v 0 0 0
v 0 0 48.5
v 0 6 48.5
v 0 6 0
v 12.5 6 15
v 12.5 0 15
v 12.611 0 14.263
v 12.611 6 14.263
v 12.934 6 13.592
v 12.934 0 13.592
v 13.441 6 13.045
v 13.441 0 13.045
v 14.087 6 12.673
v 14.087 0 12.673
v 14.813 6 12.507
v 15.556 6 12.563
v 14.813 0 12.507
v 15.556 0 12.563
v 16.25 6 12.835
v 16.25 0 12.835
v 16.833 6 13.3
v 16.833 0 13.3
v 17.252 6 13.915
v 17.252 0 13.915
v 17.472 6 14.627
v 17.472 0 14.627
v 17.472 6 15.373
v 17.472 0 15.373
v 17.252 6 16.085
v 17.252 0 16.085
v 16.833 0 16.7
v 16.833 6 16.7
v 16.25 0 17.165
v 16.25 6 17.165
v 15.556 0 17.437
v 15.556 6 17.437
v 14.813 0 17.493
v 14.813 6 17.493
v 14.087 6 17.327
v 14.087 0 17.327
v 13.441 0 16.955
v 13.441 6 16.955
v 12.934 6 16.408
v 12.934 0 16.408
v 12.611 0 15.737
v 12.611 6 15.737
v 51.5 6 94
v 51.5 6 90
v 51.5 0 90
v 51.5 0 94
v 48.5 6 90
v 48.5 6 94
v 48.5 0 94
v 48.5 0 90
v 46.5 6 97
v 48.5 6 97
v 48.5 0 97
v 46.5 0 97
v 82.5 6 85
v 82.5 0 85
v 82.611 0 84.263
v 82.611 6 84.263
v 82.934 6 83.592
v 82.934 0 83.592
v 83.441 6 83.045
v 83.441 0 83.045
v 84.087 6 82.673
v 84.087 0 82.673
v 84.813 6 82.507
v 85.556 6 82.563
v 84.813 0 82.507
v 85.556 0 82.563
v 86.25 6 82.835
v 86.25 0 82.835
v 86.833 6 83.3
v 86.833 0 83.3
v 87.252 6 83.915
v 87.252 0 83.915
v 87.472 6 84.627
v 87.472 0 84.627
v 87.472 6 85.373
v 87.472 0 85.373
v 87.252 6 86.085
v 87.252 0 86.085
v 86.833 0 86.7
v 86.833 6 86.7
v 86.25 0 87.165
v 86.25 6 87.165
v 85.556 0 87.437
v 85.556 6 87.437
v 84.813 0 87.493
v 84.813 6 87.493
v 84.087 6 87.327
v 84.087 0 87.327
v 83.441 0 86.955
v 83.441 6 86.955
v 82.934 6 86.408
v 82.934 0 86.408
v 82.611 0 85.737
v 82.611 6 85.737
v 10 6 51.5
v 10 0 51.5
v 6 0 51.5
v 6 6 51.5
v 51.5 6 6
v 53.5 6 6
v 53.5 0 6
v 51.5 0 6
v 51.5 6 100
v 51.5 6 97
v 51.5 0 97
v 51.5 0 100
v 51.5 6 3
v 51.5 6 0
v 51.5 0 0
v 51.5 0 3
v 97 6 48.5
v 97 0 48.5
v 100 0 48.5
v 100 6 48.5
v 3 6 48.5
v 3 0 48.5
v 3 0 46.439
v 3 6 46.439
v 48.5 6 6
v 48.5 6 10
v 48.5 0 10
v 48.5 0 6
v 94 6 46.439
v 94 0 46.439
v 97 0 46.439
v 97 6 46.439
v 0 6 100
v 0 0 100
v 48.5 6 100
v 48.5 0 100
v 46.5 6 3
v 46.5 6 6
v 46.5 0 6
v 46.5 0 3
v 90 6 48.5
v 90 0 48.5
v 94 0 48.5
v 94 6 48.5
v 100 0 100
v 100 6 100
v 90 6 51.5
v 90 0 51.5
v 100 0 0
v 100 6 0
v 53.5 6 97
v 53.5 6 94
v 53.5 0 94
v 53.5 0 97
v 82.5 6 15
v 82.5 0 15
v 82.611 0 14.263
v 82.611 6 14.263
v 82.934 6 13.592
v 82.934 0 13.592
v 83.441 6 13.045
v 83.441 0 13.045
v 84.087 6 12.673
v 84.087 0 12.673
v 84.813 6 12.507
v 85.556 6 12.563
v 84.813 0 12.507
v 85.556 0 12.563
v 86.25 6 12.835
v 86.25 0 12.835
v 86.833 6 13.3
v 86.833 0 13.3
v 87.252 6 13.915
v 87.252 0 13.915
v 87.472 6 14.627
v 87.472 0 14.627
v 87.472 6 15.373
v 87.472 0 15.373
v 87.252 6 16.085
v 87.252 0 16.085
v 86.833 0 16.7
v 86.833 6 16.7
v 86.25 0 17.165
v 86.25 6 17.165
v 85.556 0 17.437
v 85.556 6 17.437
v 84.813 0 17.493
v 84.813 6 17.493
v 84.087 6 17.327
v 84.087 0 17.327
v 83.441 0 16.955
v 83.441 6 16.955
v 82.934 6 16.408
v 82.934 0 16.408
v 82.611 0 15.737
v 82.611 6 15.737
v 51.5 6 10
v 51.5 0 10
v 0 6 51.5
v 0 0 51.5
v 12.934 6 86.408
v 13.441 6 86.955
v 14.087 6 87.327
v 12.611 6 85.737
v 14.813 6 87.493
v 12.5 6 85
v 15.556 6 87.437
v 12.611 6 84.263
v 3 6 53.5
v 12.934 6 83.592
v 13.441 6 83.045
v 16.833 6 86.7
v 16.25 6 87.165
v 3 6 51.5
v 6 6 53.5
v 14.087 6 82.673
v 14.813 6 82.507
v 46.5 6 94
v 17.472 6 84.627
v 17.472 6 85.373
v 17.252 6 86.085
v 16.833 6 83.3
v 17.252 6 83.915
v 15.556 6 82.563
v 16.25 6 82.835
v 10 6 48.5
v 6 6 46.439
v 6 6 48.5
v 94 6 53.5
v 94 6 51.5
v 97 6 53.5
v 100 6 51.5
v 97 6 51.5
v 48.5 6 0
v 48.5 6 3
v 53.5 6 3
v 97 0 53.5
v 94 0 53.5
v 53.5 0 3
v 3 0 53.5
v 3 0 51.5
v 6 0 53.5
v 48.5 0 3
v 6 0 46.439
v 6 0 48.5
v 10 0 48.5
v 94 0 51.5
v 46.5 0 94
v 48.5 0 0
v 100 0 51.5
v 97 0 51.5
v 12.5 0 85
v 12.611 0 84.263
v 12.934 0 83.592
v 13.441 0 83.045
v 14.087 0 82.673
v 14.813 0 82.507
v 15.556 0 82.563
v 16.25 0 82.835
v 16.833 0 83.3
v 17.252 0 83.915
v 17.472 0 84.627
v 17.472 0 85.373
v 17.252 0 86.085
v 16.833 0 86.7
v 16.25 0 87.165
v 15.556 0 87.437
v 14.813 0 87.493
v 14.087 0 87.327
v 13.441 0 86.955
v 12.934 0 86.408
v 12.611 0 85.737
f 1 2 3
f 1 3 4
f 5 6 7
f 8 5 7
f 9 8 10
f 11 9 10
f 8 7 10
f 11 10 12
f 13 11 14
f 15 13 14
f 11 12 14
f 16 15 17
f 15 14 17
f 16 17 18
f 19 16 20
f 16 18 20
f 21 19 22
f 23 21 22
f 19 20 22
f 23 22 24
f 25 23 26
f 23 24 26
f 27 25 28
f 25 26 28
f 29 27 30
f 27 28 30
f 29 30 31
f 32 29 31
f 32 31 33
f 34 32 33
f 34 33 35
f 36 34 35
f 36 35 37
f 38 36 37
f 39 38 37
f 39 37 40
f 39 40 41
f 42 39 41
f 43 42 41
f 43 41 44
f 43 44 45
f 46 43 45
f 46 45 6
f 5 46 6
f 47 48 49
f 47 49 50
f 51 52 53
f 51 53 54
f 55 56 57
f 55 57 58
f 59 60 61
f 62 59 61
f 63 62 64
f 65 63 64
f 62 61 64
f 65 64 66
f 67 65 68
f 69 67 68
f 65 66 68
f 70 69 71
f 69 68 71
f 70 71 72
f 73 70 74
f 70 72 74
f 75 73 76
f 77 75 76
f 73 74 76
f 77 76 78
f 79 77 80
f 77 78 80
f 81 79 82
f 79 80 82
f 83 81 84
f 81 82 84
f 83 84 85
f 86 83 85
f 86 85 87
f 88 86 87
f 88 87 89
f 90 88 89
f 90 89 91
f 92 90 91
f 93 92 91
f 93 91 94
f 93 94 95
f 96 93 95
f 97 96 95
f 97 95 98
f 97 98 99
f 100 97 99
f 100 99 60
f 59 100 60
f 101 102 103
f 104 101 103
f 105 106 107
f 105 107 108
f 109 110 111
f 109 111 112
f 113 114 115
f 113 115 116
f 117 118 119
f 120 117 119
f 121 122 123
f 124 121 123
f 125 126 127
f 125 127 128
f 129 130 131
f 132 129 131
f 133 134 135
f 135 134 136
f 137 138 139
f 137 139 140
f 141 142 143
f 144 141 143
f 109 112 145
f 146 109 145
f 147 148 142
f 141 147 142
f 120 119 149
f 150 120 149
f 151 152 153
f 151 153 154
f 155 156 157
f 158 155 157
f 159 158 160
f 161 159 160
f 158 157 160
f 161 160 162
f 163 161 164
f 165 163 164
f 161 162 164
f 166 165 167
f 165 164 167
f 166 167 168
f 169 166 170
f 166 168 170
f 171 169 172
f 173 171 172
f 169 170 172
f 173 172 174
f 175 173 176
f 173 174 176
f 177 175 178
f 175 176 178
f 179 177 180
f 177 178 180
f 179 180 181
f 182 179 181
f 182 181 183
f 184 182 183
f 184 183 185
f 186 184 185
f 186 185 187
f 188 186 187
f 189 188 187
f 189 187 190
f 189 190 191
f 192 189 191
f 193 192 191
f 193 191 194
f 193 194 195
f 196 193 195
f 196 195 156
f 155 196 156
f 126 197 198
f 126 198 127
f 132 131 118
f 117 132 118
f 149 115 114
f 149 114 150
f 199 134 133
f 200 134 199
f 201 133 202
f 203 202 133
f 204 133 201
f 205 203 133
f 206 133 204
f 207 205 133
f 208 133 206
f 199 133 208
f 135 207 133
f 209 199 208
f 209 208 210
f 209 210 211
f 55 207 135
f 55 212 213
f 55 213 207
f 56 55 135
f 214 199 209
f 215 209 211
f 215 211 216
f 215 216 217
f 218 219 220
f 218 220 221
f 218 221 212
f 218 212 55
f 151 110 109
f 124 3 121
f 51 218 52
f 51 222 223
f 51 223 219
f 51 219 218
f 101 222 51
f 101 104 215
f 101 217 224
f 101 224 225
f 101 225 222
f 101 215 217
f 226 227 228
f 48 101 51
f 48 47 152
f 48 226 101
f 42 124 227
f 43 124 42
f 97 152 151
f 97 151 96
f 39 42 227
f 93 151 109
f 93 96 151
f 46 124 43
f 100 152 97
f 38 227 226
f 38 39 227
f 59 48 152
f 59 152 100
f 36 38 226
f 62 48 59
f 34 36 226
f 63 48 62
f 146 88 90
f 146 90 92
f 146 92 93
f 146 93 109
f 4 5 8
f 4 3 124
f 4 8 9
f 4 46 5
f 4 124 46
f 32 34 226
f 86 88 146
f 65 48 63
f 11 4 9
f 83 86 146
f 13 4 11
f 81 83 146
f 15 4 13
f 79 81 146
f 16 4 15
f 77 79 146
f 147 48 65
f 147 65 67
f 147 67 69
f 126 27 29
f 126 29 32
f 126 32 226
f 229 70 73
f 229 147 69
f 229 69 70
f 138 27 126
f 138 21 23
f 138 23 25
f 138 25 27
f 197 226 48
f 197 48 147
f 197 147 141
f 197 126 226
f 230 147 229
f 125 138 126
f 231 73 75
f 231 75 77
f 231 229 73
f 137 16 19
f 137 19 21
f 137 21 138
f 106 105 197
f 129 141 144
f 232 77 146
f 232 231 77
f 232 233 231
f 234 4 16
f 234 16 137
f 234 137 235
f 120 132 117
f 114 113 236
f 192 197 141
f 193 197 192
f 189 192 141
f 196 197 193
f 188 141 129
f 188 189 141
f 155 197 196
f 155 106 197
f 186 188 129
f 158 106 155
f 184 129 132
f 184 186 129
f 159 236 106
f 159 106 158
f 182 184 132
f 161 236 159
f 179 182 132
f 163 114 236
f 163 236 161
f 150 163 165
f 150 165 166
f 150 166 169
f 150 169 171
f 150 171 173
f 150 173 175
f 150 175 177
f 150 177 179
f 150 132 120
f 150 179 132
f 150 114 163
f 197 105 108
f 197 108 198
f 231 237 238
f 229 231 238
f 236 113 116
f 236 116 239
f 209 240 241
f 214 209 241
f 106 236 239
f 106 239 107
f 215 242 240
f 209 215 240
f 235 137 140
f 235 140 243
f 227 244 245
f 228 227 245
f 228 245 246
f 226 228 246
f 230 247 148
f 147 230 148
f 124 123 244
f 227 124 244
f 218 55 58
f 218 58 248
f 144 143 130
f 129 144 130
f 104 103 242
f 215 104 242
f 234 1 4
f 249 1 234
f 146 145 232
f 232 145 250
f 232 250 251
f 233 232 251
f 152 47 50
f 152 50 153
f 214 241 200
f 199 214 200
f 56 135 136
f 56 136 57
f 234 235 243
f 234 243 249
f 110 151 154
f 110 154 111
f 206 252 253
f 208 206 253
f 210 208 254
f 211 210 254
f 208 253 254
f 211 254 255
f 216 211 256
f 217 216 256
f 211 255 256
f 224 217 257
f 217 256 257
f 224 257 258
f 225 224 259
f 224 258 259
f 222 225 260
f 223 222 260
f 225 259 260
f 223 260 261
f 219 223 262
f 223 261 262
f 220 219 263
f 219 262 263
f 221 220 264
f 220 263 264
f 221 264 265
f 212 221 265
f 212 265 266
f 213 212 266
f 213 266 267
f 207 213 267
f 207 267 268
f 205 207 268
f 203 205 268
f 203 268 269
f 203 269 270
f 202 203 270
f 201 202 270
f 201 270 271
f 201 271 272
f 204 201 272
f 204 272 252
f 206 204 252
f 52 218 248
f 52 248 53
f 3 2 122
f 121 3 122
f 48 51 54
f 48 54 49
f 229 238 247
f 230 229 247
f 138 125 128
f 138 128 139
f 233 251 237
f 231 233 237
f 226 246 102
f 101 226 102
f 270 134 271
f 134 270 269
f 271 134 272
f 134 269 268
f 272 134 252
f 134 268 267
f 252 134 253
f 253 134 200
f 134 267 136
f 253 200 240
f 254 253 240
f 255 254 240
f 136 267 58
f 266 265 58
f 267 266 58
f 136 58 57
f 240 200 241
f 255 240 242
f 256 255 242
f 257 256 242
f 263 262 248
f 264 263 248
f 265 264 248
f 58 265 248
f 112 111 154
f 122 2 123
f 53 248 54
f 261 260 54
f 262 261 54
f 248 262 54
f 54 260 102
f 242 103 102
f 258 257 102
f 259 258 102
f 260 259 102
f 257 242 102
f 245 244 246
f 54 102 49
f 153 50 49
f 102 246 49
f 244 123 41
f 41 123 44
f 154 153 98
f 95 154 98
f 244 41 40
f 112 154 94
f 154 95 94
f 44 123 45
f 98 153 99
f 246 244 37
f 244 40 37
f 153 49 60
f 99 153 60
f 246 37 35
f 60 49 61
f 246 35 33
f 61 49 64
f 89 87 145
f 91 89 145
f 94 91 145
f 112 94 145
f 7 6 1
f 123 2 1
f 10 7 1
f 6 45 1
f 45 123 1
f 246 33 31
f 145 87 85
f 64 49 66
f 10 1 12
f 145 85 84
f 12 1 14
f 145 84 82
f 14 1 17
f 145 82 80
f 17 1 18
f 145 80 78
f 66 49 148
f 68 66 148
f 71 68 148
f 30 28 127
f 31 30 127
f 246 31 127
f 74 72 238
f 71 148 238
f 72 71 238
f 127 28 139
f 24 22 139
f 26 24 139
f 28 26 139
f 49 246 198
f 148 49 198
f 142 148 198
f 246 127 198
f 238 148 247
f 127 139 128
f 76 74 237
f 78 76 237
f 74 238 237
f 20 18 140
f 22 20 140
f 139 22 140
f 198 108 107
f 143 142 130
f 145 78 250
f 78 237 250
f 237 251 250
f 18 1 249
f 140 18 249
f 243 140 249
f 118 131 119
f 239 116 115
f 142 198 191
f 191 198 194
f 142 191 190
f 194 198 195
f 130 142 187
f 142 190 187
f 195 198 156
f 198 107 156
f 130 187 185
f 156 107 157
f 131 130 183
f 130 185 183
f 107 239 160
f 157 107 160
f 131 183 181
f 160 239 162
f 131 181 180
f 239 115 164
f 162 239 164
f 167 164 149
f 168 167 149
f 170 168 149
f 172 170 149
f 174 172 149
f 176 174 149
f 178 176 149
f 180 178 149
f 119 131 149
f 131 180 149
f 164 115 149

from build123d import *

# Parameters (mm, degrees)
SKETCH1_W           = 100
SKETCH1_H           = 100
BOSS_EXTRUDE1_DEPTH = 6
CUT_EXTRUDE1_DEPTH  = 7
SKETCH4_R           = 2.5
CUT_EXTRUDE3_DEPTH  = 7
CUT_EXTRUDE4_DEPTH  = 10


with BuildPart() as part:
    # Sketch1 → Boss-Extrude1 (new body)
    with BuildSketch(Plane(origin=(0, 0, 0), x_dir=(1, 0, 0), z_dir=(0, 1, 0))):
        with Locations((50, -50)):
            Rectangle(SKETCH1_W, SKETCH1_H)
    extrude(amount=BOSS_EXTRUDE1_DEPTH)

    # Sketch2 → Cut-Extrude1 (cut, through all)
    with BuildSketch(Plane(origin=(0, 6, 0), x_dir=(1, 0, 0), z_dir=(0, 1, 0))):
        Polygon((48.5, 0), (51.5, 0), (51.5, -3), (53.5, -3), (53.5, -6), (51.5, -6), (51.5, -10), (48.5, -10), (48.5, -6), (46.5, -6), (46.5, -3), (48.5, -3), align=None)
        Polygon((48.5, -100), (48.5, -97), (46.5, -97), (46.5, -94), (48.5, -94), (48.5, -90), (51.5, -90), (51.5, -94), (53.5, -94), (53.5, -97), (51.5, -97), (51.5, -100), align=None)
    extrude(amount=-CUT_EXTRUDE1_DEPTH, mode=Mode.SUBTRACT)

    # Sketch4 → Cut-Extrude3 (cut, through all)
    with BuildSketch(Plane(origin=(0, 0, 0), x_dir=(-1, 0, 0), z_dir=(0, -1, 0))):
        with Locations((-15, -85)):
            Circle(SKETCH4_R)
        with Locations((-85, -85)):
            Circle(SKETCH4_R)
        with Locations((-85, -15)):
            Circle(SKETCH4_R)
        with Locations((-15, -15)):
            Circle(SKETCH4_R)
    extrude(amount=-CUT_EXTRUDE3_DEPTH, mode=Mode.SUBTRACT)

    # Sketch5 → Cut-Extrude4 (cut)
    with BuildSketch(Plane.XZ):
        Polygon((0, 51.193613504), (0, 50), (0, 48.5), (3, 48.5), (3, 46.439353032), (6, 46.439353032), (6, 48.5), (10, 48.5), (10, 50), (10, 51.5), (6, 51.5), (6, 53.5), (3, 53.5), (3, 51.5), (0, 51.5), align=None)
        Polygon((100, 48.5), (100, 50), (100, 51.5), (97, 51.5), (97, 53.5), (94, 53.5), (94, 51.5), (90, 51.5), (90, 50), (90, 48.5), (94, 48.5), (94, 46.439353032), (97, 46.439353032), (97, 48.5), align=None)
    extrude(amount=-CUT_EXTRUDE4_DEPTH, mode=Mode.SUBTRACT)


solid = part.part
